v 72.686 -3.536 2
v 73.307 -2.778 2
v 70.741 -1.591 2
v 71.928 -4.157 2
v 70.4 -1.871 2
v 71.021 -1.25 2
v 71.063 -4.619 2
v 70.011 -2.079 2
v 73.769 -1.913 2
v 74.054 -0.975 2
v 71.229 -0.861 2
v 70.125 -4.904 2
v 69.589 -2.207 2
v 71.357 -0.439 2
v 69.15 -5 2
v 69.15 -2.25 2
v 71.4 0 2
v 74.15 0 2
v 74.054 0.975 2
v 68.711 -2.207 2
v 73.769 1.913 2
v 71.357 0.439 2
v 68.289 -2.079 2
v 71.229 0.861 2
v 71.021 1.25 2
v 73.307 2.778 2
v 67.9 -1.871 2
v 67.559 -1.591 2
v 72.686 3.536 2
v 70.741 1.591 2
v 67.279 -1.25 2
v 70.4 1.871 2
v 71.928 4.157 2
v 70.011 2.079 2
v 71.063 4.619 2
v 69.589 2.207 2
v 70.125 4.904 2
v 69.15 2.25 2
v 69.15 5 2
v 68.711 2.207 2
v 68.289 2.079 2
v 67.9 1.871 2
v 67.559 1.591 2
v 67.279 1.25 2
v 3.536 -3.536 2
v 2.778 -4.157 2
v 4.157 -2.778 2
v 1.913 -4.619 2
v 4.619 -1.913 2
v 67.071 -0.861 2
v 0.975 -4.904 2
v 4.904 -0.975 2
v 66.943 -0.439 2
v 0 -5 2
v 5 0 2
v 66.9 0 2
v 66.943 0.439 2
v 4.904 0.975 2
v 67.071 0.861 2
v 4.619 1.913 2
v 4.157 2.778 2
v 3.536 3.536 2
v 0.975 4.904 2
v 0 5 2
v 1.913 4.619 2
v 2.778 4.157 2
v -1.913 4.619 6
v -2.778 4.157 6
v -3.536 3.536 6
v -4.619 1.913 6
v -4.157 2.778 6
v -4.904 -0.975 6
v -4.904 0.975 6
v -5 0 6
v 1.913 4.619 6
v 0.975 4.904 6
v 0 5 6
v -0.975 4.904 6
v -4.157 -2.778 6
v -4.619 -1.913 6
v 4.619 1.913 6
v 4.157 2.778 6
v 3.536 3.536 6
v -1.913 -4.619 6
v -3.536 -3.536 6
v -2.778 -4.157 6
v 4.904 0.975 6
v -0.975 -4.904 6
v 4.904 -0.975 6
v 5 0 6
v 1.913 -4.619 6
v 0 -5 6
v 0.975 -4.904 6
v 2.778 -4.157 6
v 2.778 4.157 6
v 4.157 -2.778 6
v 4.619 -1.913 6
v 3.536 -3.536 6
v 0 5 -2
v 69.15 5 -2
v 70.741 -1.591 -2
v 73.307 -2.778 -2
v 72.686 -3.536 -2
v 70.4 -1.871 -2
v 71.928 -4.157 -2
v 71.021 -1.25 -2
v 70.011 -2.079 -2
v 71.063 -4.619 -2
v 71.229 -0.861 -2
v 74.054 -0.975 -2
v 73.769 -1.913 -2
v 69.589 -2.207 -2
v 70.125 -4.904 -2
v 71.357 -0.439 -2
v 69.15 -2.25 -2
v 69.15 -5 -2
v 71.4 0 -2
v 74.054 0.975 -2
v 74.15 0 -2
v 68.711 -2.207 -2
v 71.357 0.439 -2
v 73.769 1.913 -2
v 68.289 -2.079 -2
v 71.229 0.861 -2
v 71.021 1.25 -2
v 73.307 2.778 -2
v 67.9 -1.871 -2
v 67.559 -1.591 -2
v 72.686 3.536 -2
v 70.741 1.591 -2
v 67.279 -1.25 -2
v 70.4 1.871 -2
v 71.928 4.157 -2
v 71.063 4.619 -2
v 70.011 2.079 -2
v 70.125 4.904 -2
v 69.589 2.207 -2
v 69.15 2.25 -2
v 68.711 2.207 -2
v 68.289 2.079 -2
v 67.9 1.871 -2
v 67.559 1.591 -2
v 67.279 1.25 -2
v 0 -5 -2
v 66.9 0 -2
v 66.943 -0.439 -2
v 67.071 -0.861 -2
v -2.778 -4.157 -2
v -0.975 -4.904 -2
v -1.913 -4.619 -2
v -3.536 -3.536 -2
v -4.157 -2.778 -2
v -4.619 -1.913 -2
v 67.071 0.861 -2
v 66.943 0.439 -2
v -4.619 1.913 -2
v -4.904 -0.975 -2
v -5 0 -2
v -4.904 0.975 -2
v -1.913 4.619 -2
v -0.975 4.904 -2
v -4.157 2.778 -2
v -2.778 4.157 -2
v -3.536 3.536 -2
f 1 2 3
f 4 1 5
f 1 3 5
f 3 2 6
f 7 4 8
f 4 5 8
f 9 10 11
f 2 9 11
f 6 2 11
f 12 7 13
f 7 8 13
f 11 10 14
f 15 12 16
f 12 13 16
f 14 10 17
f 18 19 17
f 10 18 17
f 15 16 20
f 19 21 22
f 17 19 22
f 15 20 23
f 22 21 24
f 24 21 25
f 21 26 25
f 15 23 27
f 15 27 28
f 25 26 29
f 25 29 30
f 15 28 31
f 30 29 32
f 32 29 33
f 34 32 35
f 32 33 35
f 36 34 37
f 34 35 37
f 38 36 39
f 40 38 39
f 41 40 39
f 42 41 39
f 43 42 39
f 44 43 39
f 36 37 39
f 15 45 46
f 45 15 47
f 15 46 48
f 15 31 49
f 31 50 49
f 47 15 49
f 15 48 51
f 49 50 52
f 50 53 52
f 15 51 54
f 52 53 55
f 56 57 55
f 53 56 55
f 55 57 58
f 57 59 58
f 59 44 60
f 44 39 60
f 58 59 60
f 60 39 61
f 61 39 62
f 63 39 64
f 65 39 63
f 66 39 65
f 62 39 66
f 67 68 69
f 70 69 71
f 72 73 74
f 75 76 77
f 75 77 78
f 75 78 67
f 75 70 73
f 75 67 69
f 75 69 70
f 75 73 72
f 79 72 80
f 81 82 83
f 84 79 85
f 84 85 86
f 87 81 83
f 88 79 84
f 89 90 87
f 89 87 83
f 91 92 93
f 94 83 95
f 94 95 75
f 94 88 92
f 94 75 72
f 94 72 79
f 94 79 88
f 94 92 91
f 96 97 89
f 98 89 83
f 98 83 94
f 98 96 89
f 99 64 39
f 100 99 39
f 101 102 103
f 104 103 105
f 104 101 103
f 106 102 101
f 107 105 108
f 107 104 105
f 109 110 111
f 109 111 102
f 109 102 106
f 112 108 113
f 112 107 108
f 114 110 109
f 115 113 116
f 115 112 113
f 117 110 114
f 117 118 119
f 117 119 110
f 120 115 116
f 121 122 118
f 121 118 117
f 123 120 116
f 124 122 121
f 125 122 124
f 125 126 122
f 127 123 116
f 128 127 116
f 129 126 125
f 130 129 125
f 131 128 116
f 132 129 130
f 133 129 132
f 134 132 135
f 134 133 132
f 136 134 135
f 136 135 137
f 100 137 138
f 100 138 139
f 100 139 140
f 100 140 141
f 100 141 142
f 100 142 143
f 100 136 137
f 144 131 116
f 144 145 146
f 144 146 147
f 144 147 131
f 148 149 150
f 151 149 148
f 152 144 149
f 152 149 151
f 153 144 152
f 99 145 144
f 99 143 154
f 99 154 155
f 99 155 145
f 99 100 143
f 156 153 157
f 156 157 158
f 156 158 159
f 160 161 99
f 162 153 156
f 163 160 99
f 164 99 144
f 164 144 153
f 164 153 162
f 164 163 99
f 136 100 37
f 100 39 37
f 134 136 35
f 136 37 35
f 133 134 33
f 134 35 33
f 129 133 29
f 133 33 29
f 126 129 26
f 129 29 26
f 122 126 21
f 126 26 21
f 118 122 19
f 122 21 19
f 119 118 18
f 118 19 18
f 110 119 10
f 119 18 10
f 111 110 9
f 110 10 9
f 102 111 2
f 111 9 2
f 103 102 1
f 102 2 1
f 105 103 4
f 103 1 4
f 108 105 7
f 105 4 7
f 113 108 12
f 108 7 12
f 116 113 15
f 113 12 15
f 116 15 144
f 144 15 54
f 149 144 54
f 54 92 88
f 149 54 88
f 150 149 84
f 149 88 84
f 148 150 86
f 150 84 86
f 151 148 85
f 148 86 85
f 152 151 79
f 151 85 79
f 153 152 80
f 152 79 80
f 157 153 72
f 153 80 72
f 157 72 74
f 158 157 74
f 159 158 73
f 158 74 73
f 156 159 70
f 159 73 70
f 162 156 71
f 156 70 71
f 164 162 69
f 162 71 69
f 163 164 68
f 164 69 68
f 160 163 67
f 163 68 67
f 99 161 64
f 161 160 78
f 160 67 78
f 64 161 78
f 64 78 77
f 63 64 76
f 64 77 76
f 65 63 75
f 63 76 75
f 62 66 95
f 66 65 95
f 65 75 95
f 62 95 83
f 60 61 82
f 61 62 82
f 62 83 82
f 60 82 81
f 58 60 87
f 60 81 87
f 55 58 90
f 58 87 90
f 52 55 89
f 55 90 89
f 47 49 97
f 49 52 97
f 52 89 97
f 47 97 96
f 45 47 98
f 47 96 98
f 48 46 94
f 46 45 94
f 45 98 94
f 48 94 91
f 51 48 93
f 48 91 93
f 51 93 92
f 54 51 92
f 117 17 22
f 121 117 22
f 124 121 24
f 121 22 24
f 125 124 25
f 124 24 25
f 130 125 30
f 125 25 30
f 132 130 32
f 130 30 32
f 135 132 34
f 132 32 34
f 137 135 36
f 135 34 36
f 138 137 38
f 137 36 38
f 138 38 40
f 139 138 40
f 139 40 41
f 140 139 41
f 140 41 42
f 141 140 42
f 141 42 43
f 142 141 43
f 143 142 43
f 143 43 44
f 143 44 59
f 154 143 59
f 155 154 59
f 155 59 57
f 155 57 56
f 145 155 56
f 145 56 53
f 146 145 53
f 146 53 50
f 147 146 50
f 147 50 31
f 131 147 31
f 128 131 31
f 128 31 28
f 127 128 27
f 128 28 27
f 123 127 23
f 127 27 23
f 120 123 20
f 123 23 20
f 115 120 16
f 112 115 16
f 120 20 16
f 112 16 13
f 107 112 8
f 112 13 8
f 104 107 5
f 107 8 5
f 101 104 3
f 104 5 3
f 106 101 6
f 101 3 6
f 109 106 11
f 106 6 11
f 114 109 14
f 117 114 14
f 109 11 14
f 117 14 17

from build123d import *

# Parameters (mm, degrees)
BOSS_EXTRUDE1_DEPTH  = 2
SKETCH2_R            = 5
BOSS_EXTRUDE2_DEPTH  = 4
M4_CLEARANCE_HOLE1_D = 4.5


with BuildPart() as part:
    # Sketch1 → Boss-Extrude1 (new, symmetric)
    with BuildSketch(Plane.XY):
        with BuildLine():
            Line((0, 5), (69.15, 5))
            ThreePointArc((69.15, 5), (74.15, 0), (69.15, -5))
            Line((69.15, -5), (0, -5))
            ThreePointArc((0, -5), (-5, 0), (0, 5))
        make_face()
    extrude(amount=BOSS_EXTRUDE1_DEPTH, both=True)

    # Sketch2 → Boss-Extrude2 (add, symmetric)
    with BuildSketch(Plane.XY.offset(2)):
        with Locations(Location((0, 0, 0), (0, 0, 270))):
            Circle(SKETCH2_R)
    extrude(amount=BOSS_EXTRUDE2_DEPTH, both=True)

    # M4 Clearance Hole1 (through all)
    with Locations(Plane(origin=(0, 0, -2), x_dir=(-1, 0, 0), z_dir=(0, 0, -1))):
        with Locations((-69.15, 0)):
            Hole(M4_CLEARANCE_HOLE1_D / 2)


solid = part.part
